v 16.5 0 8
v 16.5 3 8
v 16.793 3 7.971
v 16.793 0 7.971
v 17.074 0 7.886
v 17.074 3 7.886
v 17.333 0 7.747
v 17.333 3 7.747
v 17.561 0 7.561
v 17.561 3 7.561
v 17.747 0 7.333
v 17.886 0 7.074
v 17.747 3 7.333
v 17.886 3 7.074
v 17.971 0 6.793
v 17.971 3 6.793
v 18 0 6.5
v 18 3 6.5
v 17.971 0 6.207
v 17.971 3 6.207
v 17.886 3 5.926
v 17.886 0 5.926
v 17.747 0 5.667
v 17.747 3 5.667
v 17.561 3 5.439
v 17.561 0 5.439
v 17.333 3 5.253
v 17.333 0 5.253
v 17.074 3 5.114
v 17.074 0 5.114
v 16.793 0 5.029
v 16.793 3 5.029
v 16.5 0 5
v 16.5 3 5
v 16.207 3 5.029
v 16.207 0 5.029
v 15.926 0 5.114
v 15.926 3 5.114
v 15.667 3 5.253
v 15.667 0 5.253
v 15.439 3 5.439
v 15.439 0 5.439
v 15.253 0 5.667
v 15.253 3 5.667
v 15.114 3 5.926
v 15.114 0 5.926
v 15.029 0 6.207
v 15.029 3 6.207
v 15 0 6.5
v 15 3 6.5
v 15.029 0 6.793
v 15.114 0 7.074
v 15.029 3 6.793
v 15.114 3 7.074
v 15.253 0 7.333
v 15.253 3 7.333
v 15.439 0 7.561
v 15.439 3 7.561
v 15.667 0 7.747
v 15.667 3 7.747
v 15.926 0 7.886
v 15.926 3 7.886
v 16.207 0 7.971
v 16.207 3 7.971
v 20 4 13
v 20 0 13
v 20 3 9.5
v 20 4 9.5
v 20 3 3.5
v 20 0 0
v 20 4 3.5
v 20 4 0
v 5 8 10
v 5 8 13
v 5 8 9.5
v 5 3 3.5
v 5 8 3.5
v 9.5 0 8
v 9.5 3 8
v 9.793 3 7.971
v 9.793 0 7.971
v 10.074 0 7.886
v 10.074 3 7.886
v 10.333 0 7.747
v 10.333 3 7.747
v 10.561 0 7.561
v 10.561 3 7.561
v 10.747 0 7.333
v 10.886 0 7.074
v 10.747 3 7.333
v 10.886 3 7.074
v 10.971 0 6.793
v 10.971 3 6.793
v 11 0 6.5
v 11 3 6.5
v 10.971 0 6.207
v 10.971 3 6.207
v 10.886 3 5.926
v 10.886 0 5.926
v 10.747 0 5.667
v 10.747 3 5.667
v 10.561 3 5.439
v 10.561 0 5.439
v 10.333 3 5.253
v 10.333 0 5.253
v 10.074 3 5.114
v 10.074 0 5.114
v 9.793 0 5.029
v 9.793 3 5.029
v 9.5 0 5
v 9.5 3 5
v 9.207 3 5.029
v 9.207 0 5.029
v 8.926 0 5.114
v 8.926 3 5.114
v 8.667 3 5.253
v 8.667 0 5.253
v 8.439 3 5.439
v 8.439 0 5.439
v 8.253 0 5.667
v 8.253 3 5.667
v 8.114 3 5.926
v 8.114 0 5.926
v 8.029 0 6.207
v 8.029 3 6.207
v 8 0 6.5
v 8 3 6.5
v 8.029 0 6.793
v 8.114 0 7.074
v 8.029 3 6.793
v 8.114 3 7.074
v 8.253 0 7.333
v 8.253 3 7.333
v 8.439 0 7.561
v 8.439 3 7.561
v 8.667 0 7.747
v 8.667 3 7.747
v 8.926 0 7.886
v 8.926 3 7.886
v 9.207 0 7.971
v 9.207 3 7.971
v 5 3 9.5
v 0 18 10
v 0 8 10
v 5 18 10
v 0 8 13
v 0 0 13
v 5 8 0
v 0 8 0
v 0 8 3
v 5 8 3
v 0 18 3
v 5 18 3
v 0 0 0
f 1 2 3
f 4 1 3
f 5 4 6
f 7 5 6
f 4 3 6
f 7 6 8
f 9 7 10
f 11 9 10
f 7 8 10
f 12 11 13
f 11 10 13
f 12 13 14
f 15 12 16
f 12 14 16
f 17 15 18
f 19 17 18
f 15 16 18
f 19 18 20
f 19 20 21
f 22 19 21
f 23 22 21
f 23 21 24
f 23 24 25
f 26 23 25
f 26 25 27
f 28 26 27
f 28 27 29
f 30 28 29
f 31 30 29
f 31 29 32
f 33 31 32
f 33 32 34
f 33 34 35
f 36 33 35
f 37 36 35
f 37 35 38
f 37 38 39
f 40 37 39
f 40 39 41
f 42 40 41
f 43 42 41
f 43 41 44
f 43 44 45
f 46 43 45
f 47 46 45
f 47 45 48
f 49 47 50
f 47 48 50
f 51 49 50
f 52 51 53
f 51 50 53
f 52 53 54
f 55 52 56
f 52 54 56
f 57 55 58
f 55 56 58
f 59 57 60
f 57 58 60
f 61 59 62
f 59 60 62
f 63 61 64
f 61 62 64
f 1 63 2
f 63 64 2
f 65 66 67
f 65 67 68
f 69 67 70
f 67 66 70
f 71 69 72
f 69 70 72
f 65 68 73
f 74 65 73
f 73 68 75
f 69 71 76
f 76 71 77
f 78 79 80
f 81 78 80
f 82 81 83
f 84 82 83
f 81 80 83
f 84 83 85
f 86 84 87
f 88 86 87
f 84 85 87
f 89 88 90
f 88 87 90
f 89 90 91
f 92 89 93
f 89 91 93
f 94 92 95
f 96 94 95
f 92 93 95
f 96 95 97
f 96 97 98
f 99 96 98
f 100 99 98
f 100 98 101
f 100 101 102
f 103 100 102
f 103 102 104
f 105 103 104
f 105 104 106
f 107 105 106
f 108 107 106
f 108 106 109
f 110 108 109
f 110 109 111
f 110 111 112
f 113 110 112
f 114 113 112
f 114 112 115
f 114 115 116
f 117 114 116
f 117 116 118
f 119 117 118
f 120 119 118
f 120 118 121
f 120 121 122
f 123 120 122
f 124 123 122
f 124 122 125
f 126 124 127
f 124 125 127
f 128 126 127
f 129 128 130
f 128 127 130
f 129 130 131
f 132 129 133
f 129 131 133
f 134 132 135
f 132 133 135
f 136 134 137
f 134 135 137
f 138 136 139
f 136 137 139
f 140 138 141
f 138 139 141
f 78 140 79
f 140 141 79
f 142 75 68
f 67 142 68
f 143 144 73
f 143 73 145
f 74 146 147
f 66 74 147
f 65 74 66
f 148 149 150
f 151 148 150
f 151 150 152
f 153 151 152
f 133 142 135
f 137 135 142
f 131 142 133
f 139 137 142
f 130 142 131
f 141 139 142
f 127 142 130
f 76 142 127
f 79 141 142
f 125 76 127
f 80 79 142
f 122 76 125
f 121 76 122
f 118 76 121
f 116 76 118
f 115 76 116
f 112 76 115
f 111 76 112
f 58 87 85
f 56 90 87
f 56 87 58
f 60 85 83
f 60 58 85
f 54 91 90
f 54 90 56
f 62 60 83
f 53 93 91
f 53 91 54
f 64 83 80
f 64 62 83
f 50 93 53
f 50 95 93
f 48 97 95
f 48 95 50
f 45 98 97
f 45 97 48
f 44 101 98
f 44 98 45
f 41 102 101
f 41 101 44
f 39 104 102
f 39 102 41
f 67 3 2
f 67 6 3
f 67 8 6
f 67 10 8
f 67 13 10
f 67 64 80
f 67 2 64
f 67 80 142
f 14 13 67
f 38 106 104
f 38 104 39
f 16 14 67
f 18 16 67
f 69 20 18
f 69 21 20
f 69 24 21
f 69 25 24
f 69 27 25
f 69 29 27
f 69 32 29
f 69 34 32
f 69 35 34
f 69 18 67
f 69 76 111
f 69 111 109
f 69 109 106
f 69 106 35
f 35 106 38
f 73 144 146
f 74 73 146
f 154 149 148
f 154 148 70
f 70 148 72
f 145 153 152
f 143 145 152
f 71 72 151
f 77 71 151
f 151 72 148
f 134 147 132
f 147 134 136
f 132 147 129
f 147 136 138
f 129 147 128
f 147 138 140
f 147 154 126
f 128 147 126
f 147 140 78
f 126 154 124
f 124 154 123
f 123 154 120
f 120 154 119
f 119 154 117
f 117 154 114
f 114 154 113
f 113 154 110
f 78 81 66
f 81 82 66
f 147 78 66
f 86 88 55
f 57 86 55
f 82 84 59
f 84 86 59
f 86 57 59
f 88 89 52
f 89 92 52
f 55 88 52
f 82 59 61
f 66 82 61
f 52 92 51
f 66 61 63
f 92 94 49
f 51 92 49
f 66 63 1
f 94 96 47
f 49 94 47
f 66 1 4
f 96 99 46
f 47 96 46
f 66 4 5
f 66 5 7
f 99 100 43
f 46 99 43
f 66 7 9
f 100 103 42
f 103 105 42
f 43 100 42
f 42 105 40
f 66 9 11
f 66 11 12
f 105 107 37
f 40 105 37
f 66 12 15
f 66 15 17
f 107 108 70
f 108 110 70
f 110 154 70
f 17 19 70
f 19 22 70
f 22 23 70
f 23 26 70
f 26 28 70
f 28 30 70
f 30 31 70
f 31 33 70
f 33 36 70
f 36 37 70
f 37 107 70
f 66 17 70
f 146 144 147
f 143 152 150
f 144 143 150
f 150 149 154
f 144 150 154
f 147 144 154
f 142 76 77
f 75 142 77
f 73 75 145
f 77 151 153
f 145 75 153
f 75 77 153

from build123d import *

# Parameters (mm, degrees)
EXTRUDE_1_DEPTH     = 13
SKETCH_2_W          = 3
SKETCH_2_H          = 10
CUT_EXTRUDE_1_DEPTH = 30.883105595
CUT_EXTRUDE_2_DEPTH = 5
SKETCH_4_R          = 1.5
CUT_EXTRUDE_3_DEPTH = 29.178005607


with BuildPart() as part:
    # 草图1 → 凸台-拉伸1 (new body)
    with BuildSketch(Plane.XY):
        Polygon((0, 0), (20, 0), (20, 4), (5, 8), (5, 18), (0, 18), align=None)
    extrude(amount=EXTRUDE_1_DEPTH)

    # 草图2 → 切除-拉伸1 (cut, through all)
    with BuildSketch(Plane.ZY):
        with Locations((1.5, 13)):
            Rectangle(SKETCH_2_W, SKETCH_2_H)
        with Locations((11.5, 13)):
            Rectangle(SKETCH_2_W, SKETCH_2_H)
    extrude(amount=-CUT_EXTRUDE_1_DEPTH, mode=Mode.SUBTRACT)

    # 草图3 → 切除-拉伸2 (cut)
    with BuildSketch(Plane(origin=(0, 8, 0), x_dir=(-1, 0, 0), z_dir=(0, -1, 0))):
        Polygon((-5, -6.5), (-5, -9.5), (-20, -9.5), (-20, -3.5), (-5, -3.5), align=None)
    extrude(amount=CUT_EXTRUDE_2_DEPTH, mode=Mode.SUBTRACT)

    # 草图4 → 切除-拉伸3 (cut, through all)
    with BuildSketch(Plane(origin=(0, 3, 0), x_dir=(1, 0, 0), z_dir=(0, 1, 0))):
        with Locations(Location((16.5, -6.5, 0), (0, 0, 270))):
            Circle(SKETCH_4_R)
        with Locations(Location((9.5, -6.5, 0), (0, 0, 270))):
            Circle(SKETCH_4_R)
    extrude(amount=-CUT_EXTRUDE_3_DEPTH, mode=Mode.SUBTRACT)


solid = part.part
